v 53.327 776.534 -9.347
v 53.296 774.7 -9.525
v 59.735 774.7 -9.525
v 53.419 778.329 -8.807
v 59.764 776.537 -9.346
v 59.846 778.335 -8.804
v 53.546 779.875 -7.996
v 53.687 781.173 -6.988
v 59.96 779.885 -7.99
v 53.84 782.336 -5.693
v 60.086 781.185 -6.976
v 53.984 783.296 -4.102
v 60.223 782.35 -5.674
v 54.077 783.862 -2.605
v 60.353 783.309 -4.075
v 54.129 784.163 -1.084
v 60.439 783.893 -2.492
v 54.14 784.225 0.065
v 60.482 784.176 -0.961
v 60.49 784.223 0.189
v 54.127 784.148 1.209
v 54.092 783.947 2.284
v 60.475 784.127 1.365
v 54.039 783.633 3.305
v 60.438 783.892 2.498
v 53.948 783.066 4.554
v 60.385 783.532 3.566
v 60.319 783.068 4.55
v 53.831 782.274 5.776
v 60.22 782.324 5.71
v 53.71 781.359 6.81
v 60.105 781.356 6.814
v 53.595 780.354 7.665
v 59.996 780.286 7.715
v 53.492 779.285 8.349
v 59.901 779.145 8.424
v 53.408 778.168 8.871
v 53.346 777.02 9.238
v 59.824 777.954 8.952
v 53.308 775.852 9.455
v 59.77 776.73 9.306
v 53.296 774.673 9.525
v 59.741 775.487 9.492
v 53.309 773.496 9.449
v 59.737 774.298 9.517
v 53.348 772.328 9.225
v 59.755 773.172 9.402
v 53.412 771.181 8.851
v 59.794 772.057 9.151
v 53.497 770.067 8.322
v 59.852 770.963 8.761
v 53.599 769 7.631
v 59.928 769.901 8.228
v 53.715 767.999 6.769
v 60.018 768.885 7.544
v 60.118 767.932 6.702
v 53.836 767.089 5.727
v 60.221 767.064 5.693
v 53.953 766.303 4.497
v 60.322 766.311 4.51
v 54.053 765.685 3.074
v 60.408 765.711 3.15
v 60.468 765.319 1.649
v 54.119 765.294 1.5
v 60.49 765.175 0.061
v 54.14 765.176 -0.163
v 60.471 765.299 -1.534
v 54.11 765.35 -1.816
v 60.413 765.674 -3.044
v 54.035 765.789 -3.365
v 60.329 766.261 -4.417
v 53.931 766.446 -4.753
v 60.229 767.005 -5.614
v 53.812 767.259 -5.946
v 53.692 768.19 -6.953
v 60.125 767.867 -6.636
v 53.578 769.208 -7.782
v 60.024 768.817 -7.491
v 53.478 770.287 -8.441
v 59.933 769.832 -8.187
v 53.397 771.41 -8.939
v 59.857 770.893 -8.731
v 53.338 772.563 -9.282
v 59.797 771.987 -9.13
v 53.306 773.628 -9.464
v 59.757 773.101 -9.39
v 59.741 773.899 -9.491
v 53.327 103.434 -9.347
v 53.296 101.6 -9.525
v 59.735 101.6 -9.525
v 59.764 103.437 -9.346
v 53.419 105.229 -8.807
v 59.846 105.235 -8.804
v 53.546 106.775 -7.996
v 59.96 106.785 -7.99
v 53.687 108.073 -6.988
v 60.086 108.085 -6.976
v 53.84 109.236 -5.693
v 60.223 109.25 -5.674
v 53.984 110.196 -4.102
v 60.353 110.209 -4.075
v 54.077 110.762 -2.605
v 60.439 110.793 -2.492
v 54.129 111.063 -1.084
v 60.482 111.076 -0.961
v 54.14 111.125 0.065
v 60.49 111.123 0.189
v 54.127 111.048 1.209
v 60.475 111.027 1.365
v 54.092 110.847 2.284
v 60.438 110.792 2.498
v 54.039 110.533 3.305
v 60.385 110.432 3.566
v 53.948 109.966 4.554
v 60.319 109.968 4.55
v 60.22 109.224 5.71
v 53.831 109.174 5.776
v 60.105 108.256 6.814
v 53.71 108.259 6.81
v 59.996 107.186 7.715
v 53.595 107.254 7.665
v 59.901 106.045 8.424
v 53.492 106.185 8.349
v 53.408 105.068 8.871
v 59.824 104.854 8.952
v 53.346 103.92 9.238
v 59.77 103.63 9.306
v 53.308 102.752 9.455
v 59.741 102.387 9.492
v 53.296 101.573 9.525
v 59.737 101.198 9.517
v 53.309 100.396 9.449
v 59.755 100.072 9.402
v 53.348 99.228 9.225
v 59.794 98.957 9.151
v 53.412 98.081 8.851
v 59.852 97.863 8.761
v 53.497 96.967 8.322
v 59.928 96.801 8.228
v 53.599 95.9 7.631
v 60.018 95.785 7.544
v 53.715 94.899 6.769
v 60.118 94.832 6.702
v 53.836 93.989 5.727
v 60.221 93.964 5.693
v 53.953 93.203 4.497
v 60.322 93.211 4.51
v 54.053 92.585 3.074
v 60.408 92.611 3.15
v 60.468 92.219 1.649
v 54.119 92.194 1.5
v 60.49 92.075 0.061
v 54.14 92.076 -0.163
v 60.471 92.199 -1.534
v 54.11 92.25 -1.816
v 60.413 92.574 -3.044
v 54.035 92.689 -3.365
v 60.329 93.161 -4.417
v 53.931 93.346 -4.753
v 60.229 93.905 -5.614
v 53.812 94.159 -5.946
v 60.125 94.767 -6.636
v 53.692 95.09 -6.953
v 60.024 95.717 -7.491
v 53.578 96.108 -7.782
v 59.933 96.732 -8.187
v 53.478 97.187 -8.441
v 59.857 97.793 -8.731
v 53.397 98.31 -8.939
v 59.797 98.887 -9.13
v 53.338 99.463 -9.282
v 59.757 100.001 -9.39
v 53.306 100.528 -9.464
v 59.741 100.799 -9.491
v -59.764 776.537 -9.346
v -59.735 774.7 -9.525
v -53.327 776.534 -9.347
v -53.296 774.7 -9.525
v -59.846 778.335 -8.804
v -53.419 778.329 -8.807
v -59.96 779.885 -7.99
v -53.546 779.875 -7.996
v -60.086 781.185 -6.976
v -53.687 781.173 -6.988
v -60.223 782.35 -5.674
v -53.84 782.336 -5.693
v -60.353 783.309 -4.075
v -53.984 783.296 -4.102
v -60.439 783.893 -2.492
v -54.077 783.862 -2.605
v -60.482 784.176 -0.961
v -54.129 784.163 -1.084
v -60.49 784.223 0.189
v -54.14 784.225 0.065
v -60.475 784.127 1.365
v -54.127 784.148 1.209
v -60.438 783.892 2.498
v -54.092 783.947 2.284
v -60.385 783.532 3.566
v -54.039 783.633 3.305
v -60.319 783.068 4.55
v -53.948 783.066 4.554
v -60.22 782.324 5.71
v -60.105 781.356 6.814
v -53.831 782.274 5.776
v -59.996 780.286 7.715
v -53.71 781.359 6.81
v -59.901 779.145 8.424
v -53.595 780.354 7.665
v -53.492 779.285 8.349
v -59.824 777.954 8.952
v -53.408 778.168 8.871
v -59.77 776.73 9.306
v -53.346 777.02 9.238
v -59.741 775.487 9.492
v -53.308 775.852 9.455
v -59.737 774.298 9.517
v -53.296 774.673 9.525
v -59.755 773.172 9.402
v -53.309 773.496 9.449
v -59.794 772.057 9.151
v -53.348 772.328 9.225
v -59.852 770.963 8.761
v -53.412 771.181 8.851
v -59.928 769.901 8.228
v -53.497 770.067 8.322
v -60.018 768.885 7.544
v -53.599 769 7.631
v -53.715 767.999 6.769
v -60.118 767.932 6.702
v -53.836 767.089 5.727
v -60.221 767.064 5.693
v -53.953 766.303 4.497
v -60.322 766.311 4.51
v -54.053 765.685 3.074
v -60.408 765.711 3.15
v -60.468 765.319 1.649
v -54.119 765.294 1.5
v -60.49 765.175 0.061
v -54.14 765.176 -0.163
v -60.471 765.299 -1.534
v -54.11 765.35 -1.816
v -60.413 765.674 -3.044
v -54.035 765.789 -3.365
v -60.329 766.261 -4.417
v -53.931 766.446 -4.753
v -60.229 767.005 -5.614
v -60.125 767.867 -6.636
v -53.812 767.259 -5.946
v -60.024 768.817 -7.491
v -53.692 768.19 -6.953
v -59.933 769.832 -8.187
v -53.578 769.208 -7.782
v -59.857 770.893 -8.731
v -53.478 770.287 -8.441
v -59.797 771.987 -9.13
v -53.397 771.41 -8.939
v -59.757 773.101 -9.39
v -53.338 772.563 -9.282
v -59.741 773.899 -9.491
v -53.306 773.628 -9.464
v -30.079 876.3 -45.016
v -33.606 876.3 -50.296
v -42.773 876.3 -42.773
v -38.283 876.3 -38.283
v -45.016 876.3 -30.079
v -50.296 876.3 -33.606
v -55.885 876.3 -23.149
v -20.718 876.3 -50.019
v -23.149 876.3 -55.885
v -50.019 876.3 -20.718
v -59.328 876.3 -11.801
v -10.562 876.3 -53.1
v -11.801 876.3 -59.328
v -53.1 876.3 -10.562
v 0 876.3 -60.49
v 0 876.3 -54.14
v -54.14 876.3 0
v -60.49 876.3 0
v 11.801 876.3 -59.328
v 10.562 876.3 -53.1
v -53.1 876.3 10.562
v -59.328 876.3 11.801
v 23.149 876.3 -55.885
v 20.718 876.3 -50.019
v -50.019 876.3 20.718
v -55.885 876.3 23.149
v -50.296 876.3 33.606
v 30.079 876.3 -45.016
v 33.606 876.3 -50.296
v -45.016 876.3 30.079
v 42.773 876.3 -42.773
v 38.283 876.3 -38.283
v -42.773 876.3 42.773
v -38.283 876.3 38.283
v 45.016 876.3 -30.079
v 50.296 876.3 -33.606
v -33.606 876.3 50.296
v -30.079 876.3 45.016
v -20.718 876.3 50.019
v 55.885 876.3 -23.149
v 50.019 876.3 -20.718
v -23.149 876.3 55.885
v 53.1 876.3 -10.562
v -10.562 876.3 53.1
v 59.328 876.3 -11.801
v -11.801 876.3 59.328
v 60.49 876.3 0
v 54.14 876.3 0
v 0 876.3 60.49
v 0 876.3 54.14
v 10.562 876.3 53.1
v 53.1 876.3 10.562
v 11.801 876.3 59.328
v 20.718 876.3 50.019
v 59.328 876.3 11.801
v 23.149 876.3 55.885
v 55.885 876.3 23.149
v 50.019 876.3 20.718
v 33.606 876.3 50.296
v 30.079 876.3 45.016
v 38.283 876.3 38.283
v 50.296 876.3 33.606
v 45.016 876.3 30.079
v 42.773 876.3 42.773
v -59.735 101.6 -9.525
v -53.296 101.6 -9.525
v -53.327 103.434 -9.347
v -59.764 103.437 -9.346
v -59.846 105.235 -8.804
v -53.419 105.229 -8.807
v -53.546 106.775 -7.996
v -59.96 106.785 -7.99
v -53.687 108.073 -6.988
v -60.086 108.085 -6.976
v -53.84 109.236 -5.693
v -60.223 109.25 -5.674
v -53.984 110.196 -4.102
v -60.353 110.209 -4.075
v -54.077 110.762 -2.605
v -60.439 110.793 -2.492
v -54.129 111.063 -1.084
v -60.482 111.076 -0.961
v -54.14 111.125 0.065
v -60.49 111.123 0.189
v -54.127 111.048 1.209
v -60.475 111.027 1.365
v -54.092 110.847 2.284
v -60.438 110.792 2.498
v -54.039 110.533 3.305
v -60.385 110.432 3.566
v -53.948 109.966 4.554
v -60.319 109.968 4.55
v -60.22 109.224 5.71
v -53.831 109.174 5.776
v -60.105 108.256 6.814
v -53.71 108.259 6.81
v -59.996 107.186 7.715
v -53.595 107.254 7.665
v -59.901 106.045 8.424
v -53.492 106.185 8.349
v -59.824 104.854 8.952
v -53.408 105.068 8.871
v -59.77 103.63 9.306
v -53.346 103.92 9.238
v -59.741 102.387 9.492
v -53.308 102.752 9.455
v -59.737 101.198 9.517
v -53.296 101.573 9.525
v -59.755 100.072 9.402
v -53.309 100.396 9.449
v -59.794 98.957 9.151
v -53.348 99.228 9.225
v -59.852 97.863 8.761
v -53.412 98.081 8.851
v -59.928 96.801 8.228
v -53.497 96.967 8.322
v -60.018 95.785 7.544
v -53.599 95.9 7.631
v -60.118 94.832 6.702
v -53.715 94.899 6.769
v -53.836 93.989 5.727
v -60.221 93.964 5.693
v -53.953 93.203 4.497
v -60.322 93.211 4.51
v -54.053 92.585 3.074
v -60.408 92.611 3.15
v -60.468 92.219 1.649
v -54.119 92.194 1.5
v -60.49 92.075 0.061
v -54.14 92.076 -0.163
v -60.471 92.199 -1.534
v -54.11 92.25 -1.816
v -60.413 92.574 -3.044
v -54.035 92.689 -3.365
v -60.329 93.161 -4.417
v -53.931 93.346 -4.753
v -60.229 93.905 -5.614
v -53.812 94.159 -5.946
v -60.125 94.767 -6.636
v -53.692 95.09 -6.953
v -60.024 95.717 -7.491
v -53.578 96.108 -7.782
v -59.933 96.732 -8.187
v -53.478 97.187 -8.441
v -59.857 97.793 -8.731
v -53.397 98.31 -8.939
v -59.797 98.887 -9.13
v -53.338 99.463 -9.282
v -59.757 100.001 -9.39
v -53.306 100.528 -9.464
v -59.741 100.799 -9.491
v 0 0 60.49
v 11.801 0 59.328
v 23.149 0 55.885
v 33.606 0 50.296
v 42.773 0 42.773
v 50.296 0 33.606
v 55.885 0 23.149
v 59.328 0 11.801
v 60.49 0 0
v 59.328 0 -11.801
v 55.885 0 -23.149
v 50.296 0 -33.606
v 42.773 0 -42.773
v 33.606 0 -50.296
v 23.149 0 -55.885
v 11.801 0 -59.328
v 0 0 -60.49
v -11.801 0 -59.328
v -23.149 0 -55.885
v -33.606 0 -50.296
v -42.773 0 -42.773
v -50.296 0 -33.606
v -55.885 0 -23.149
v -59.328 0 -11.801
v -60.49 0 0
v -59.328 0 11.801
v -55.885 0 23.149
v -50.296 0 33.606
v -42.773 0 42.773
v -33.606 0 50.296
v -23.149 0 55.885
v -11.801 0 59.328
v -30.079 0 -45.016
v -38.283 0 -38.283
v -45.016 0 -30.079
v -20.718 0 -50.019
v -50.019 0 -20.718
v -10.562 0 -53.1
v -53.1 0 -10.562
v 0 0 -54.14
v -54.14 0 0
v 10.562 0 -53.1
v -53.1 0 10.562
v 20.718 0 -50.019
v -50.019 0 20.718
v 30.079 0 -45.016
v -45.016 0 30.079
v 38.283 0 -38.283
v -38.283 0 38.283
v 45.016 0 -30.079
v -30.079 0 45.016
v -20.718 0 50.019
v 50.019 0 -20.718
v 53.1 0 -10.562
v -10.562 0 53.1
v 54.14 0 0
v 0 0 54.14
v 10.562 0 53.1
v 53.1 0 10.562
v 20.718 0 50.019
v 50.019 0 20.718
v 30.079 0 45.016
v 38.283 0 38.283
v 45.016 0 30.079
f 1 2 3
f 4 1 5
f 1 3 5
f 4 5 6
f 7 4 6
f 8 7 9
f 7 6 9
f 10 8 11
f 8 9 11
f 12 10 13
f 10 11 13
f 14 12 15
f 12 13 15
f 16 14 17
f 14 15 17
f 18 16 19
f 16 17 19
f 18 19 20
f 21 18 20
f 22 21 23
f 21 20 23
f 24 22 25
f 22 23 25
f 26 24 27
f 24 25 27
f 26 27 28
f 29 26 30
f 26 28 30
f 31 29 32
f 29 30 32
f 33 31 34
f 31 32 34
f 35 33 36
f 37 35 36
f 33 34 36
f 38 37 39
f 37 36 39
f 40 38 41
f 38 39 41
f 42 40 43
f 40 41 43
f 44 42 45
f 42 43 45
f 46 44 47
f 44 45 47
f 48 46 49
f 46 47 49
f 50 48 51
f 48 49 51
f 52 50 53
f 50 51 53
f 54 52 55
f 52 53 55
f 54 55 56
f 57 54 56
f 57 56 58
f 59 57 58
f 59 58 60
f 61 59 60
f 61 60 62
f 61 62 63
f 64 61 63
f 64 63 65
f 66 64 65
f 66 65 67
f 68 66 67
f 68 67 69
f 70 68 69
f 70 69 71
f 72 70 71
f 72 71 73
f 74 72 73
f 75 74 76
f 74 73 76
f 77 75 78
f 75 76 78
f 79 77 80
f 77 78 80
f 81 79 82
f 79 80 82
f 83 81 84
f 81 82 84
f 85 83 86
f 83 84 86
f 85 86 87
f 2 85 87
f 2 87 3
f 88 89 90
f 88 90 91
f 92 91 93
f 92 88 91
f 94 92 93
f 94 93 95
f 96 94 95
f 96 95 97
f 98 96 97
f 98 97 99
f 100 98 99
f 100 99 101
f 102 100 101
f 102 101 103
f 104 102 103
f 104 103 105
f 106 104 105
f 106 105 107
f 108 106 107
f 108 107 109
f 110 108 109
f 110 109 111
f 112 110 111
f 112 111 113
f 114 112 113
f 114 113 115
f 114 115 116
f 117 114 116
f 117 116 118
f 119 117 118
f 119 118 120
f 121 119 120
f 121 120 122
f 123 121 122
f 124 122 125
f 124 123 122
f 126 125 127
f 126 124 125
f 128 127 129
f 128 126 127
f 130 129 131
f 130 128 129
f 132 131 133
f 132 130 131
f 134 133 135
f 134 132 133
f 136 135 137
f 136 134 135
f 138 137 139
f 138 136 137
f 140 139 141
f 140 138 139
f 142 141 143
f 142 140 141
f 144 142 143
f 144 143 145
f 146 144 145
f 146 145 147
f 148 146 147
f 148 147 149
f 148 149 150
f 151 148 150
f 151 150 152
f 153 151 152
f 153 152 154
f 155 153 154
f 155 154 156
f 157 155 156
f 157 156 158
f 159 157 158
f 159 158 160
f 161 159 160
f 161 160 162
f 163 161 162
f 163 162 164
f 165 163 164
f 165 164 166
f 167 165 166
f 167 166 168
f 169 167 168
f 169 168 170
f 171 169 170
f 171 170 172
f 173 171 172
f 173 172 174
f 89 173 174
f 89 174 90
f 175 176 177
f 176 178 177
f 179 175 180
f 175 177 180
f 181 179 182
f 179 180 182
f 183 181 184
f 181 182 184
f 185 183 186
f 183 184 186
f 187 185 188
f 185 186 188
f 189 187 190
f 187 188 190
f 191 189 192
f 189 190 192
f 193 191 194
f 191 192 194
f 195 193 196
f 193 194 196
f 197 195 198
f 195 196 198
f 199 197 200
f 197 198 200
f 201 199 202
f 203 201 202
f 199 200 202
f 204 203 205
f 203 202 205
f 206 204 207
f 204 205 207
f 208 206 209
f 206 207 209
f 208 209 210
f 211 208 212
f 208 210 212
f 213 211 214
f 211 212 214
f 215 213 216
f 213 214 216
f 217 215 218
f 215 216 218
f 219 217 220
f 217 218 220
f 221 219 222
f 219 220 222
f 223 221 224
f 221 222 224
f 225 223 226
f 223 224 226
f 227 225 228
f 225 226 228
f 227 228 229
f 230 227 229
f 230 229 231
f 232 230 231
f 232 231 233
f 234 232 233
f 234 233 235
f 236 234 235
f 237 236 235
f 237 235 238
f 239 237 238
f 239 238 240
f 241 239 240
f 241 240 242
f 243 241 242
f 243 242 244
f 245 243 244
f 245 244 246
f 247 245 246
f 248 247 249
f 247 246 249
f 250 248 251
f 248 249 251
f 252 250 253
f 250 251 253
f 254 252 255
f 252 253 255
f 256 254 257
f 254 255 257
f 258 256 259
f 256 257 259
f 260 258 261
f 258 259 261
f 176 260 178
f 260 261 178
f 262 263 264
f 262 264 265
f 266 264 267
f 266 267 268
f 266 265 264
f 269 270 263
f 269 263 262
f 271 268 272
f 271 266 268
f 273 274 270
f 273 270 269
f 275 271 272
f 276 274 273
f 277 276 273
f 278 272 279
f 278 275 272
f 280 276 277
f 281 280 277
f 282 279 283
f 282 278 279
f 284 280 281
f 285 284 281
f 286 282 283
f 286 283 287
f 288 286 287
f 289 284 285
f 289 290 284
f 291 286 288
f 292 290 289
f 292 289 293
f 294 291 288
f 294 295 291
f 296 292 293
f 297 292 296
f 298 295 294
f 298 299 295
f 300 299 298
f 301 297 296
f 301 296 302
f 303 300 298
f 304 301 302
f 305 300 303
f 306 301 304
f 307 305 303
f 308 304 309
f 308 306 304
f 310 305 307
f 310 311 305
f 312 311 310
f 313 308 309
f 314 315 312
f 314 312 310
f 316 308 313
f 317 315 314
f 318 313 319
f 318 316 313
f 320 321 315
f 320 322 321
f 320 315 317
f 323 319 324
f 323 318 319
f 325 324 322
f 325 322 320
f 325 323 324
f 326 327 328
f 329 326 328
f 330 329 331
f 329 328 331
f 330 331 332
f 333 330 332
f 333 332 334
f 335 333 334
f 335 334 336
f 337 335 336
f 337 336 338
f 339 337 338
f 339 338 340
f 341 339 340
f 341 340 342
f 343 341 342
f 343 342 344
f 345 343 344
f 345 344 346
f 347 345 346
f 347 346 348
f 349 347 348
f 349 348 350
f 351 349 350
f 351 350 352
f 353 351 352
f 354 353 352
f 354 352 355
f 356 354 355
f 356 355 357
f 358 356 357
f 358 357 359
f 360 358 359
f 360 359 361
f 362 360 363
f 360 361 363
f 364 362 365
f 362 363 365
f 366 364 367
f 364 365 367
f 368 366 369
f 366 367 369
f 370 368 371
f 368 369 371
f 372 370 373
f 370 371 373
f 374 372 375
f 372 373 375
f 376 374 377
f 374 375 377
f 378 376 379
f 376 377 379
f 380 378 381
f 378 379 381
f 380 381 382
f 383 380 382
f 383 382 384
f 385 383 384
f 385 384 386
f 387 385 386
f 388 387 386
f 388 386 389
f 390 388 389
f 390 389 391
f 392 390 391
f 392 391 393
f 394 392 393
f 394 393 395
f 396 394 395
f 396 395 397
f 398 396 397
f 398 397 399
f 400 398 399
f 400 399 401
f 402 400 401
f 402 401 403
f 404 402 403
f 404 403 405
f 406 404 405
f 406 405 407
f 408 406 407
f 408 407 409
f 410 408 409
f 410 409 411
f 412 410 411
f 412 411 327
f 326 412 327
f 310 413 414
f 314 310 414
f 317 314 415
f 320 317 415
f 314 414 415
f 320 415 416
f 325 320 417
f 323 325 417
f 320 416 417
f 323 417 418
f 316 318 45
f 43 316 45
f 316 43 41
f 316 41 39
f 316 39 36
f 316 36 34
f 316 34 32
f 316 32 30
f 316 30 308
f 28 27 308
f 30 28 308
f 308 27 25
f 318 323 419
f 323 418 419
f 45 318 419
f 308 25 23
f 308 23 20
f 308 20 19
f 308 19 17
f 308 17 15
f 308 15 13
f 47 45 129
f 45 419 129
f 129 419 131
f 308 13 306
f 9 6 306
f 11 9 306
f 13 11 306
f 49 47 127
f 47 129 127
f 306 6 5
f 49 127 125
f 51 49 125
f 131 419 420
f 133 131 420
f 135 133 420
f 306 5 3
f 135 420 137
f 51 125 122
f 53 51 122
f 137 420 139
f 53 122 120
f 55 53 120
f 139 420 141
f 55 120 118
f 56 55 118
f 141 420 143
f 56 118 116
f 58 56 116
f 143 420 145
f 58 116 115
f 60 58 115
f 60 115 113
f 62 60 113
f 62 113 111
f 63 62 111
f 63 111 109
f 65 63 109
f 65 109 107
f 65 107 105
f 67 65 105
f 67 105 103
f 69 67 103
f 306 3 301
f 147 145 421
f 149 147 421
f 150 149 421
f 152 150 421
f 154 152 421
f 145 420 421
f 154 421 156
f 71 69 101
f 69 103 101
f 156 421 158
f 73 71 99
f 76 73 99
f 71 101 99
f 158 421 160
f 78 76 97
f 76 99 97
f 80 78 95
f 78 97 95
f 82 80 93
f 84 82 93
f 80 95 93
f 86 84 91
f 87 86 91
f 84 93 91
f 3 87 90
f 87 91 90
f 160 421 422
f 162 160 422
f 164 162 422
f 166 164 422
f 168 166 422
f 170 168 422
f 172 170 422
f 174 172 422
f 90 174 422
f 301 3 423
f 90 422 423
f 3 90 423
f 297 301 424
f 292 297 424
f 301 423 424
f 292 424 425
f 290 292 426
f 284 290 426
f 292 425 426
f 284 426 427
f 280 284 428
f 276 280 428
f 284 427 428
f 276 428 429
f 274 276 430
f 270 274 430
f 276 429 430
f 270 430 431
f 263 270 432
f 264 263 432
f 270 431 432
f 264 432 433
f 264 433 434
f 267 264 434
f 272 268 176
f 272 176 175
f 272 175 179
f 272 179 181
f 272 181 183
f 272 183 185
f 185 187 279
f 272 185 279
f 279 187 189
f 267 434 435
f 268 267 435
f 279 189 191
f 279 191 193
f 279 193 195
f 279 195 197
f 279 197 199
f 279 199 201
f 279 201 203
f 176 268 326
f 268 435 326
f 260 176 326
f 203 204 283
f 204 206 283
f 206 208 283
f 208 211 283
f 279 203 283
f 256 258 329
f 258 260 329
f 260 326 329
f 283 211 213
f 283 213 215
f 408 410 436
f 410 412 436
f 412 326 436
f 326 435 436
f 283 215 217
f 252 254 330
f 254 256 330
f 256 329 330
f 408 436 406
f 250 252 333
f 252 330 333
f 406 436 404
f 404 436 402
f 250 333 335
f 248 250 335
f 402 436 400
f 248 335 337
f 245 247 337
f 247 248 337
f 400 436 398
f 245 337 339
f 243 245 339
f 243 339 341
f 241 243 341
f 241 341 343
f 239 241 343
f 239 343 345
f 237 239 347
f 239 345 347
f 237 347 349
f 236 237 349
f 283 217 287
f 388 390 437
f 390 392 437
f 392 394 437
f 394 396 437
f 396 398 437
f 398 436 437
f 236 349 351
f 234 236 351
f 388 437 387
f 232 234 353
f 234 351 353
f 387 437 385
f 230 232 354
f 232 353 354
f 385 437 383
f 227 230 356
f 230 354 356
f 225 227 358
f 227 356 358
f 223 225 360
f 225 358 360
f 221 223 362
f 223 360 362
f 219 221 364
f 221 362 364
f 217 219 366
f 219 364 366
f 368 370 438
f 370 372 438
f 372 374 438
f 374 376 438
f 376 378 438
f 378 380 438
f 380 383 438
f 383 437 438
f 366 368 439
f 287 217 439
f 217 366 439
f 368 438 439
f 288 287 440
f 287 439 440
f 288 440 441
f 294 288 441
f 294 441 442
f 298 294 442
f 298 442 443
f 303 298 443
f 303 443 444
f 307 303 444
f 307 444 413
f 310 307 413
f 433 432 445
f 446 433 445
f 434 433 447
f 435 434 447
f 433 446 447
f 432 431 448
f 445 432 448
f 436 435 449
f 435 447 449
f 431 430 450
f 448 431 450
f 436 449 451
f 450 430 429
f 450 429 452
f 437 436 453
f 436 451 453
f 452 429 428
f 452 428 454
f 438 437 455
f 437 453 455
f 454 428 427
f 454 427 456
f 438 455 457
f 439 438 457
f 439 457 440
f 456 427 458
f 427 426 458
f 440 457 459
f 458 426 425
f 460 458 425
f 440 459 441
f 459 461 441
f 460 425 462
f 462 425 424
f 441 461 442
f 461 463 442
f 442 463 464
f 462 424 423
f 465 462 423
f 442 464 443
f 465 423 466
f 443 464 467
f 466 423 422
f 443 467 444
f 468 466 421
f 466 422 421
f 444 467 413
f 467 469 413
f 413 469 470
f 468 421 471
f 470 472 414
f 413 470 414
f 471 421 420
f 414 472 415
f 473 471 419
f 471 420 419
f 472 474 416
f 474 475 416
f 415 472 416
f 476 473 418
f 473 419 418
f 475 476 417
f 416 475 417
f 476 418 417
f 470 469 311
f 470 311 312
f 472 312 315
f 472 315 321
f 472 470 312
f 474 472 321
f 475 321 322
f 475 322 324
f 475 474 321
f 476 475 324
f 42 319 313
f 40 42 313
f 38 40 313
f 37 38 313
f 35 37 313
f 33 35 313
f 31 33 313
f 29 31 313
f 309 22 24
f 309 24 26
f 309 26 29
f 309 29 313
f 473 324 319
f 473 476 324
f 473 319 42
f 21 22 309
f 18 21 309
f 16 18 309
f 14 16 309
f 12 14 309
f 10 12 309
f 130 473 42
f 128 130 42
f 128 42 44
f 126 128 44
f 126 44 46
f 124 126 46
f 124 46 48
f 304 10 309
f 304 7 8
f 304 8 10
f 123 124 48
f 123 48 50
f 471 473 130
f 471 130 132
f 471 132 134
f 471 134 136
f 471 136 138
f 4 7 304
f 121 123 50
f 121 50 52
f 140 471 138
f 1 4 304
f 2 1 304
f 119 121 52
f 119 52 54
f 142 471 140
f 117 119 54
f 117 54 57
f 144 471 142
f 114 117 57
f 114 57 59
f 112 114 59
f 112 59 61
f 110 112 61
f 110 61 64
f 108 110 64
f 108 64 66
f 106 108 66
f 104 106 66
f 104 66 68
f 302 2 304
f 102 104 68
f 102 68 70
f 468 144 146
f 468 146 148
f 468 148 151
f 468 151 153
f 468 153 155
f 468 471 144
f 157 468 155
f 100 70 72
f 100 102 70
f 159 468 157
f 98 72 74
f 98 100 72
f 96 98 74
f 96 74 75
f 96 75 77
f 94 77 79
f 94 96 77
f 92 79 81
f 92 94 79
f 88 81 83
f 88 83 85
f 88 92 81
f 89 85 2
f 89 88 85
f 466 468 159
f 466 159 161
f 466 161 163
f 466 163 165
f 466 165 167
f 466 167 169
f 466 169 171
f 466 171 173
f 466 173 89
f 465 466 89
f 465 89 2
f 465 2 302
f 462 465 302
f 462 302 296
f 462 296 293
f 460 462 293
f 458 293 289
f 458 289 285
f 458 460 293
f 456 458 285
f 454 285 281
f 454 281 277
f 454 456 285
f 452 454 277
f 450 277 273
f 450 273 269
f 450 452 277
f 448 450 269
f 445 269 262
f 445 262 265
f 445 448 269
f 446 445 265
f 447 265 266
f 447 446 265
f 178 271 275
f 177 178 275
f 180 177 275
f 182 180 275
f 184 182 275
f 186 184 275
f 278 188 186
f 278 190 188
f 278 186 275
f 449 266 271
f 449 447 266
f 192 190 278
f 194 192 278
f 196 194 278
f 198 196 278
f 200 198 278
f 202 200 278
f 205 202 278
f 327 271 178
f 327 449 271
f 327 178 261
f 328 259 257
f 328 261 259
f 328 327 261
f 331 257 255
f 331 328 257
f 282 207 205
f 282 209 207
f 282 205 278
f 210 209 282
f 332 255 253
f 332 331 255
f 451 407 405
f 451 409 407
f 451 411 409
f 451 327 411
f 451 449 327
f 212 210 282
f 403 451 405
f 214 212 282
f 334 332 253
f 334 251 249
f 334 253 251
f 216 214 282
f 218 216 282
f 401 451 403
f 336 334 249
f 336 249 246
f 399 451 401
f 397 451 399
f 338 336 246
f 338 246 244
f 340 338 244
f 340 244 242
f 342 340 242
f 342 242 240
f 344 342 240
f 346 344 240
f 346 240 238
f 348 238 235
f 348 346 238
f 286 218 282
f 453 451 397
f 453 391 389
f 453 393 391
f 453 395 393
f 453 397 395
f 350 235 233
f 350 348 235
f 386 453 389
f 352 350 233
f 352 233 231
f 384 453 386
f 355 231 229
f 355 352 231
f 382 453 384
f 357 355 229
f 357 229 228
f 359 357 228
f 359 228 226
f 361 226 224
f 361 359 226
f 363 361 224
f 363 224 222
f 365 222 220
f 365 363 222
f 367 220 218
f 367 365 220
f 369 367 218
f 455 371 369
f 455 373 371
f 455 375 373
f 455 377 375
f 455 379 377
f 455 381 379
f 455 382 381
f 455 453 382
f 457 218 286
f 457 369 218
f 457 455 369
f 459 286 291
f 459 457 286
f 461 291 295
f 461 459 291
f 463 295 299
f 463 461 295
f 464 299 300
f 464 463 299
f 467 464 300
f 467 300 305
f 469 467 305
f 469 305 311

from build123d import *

# Parameters (mm, degrees)
SKETCH2_R           = 60.49
SKETCH2_R_2         = 54.14
BOSS_EXTRUDE1_DEPTH = 876.3
SKETCH3_R           = 9.525
CUT_EXTRUDE1_DEPTH  = 438.15


with BuildPart() as part:
    # Sketch2 → Boss-Extrude1 (new body)
    with BuildSketch(Plane(origin=(0, 0, 0), x_dir=(1, 0, 0), z_dir=(0, 1, 0))):
        with Locations(Location((0, 0, 0), (0, 0, 270))):
            Circle(SKETCH2_R)
        with Locations(Location((0, 0, 0), (0, 0, 270))):
            Circle(SKETCH2_R_2, mode=Mode.SUBTRACT)
    extrude(amount=BOSS_EXTRUDE1_DEPTH)

    # Sketch3 → Cut-Extrude1 (cut, symmetric)
    with BuildSketch(Plane(origin=(0, 0, 0), x_dir=(0, 0, -1), z_dir=(1, 0, 0))):
        with Locations((0, 101.6)):
            Circle(SKETCH3_R)
        with Locations((0, 774.7)):
            Circle(SKETCH3_R)
    extrude(amount=CUT_EXTRUDE1_DEPTH, both=True, mode=Mode.SUBTRACT)


solid = part.part
